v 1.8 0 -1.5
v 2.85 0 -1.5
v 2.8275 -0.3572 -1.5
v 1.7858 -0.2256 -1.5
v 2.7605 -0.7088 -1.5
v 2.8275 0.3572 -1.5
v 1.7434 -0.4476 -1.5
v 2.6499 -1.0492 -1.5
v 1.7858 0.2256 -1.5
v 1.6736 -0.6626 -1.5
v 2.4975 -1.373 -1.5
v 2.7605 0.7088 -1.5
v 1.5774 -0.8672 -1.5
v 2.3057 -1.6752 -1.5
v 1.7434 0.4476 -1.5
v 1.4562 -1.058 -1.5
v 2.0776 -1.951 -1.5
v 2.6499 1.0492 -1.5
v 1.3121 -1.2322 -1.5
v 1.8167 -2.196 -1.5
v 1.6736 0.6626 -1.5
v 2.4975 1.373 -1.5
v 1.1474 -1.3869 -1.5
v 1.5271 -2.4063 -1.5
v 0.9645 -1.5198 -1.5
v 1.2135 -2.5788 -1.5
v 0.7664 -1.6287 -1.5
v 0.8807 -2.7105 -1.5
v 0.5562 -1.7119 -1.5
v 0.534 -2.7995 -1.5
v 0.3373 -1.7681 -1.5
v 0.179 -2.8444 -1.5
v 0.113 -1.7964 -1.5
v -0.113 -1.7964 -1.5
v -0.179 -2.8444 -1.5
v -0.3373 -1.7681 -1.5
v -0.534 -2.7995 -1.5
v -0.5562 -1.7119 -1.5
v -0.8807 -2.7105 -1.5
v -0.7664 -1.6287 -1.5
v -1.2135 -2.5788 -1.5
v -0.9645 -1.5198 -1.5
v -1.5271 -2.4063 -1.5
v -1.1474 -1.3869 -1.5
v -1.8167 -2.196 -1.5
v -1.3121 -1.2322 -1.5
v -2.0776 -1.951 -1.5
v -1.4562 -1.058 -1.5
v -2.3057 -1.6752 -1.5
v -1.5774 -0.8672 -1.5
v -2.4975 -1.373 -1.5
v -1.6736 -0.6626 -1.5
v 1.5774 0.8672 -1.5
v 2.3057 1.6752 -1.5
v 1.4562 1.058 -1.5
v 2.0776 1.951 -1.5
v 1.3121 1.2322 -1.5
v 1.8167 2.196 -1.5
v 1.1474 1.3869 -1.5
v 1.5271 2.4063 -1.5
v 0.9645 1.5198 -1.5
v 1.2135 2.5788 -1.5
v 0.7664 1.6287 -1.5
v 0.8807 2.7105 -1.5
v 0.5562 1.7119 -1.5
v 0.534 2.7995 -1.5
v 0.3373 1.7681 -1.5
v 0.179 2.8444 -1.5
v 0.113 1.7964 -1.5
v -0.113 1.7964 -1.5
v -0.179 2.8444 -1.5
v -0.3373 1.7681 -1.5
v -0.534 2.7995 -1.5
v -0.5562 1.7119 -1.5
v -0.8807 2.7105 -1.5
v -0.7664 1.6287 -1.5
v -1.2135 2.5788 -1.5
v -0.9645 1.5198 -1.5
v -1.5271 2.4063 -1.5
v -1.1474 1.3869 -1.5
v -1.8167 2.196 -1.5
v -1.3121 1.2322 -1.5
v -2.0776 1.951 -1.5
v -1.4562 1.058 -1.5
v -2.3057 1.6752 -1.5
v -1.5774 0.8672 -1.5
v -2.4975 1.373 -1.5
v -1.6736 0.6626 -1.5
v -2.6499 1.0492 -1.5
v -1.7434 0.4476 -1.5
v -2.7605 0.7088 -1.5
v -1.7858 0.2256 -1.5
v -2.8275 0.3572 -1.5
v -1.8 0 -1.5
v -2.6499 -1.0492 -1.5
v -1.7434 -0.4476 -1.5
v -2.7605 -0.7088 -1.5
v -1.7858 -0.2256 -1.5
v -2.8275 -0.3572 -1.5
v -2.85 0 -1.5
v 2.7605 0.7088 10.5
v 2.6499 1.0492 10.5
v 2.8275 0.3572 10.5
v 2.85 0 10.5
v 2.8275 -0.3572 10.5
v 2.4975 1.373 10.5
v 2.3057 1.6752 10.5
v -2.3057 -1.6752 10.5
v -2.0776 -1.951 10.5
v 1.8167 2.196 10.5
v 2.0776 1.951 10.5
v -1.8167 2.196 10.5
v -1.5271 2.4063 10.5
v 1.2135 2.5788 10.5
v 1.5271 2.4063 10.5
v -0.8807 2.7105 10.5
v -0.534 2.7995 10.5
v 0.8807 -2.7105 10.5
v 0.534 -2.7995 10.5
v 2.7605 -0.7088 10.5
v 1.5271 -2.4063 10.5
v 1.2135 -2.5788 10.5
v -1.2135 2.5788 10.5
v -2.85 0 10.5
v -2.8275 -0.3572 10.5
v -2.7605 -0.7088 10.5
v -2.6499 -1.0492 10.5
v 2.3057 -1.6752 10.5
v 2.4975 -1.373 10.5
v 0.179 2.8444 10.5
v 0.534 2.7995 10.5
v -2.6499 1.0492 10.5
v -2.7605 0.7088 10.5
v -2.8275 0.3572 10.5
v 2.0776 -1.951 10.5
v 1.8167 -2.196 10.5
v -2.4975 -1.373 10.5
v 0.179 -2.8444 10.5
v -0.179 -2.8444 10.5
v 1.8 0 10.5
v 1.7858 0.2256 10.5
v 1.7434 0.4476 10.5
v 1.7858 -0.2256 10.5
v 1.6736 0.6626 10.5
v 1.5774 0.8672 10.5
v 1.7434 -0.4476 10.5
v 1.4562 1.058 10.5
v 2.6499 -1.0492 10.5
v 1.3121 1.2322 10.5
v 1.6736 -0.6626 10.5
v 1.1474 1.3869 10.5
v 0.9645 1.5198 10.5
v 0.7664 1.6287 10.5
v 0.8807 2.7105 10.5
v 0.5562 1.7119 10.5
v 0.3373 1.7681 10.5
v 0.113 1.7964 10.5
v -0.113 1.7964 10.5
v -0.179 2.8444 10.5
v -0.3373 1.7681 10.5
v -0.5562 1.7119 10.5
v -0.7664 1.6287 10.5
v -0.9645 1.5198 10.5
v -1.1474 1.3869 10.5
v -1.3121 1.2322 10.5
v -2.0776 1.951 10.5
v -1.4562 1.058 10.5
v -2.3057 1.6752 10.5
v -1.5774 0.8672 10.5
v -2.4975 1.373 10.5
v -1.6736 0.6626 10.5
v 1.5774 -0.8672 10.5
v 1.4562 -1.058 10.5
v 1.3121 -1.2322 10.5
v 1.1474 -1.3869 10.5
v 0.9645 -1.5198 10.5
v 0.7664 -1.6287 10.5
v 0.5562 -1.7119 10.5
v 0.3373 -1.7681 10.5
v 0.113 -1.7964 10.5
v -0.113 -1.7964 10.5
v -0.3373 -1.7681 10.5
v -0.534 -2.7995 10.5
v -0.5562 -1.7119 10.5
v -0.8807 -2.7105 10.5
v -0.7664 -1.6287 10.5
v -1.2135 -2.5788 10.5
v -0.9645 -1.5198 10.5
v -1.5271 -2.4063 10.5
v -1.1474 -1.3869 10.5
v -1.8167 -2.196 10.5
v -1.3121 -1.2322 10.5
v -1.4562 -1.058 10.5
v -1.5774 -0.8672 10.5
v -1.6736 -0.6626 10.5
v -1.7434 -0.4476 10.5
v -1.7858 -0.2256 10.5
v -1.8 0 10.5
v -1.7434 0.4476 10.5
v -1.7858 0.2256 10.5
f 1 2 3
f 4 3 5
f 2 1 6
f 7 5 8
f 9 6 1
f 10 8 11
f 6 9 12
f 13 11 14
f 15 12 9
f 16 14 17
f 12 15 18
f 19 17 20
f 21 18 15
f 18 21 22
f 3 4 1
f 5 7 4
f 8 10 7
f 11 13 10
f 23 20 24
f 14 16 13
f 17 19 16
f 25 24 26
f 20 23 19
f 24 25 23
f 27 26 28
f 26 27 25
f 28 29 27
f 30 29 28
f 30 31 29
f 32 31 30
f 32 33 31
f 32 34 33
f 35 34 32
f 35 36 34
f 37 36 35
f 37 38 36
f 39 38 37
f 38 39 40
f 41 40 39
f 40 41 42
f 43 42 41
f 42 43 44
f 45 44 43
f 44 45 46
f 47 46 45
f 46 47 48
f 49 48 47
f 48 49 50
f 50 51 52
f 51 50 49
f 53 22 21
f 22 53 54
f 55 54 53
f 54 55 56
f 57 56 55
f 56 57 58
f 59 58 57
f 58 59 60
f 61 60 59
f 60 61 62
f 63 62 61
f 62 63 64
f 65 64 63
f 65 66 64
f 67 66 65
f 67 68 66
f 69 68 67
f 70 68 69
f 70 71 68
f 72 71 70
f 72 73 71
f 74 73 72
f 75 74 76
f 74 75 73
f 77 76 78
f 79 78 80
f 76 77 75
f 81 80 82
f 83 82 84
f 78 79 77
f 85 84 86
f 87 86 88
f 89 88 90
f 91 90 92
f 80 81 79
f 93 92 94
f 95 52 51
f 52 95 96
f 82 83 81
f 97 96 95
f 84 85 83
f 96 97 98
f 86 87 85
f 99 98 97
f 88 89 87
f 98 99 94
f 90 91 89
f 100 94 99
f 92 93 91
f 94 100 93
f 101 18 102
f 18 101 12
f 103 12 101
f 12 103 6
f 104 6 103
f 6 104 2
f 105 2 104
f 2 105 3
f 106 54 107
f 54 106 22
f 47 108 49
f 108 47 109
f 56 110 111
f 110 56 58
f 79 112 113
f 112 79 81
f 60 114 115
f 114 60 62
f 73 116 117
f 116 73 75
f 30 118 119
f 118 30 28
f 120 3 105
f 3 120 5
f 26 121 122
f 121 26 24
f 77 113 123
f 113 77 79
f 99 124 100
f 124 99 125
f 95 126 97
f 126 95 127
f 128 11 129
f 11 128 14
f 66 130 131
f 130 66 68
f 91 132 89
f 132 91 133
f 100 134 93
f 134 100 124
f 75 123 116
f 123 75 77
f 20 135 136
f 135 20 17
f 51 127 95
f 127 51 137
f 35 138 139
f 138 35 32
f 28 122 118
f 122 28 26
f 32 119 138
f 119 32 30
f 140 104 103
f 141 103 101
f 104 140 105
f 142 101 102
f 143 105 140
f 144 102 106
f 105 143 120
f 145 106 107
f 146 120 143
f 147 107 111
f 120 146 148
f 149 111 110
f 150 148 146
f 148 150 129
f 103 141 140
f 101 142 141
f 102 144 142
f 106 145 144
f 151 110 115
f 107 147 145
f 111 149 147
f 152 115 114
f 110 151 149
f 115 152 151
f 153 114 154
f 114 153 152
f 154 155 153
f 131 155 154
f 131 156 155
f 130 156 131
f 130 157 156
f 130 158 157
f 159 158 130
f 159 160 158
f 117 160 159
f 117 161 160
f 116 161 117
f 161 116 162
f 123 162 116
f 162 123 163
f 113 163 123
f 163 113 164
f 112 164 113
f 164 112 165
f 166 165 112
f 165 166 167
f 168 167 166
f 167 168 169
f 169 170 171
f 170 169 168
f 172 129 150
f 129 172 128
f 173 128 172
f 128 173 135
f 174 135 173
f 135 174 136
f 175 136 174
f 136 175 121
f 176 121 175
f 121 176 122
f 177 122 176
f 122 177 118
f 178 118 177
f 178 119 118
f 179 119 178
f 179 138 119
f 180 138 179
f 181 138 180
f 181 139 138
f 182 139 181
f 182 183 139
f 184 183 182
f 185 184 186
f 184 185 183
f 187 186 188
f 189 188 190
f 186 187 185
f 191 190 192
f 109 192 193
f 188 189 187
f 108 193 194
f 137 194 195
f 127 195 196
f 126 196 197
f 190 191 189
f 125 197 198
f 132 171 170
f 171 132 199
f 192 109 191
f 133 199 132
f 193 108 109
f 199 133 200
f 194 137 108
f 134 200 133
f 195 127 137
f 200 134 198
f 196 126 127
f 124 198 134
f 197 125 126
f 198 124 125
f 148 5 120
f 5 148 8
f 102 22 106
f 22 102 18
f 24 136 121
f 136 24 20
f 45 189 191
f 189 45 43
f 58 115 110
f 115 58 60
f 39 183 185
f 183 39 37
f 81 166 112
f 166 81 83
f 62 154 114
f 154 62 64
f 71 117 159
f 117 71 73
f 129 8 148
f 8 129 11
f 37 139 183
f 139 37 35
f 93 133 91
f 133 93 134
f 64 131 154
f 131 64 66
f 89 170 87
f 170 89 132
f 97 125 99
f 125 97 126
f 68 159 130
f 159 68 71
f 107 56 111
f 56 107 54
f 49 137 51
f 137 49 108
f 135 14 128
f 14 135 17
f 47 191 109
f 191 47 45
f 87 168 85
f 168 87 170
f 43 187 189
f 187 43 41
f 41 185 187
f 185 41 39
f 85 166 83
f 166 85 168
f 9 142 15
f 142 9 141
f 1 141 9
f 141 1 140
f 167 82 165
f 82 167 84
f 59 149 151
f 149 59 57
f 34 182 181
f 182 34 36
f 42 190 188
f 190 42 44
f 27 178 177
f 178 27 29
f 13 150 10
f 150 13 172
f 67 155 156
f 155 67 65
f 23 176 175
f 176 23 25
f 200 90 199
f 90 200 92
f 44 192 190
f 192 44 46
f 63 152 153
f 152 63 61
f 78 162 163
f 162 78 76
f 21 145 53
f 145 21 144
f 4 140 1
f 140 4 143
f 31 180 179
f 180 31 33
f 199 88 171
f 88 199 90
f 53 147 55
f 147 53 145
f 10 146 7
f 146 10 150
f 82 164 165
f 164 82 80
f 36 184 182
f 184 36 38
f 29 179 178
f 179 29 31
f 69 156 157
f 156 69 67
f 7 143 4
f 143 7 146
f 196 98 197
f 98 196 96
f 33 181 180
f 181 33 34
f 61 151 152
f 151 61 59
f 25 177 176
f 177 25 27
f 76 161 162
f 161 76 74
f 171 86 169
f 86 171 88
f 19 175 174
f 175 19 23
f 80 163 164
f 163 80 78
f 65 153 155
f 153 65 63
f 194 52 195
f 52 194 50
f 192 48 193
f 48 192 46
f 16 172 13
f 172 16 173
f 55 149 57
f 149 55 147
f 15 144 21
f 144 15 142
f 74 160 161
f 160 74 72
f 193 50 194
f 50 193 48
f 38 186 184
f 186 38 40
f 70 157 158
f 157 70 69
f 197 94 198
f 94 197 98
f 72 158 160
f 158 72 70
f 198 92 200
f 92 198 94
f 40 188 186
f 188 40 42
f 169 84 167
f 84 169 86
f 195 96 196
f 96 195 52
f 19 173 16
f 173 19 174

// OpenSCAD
$fn = 50;


difference() {
	union() {
		translate(v = [0, 0, -1.5000000000]) {
			cylinder(h = 3, r = 1.0000000000);
		}
		translate(v = [0, 0, -1.5000000000]) {
			cylinder(h = 12, r = 2.8500000000);
		}
	}
	union() {
		translate(v = [0, 0, -50.0000000000]) {
			cylinder(h = 100, r = 1.8000000000);
		}
	}
}
